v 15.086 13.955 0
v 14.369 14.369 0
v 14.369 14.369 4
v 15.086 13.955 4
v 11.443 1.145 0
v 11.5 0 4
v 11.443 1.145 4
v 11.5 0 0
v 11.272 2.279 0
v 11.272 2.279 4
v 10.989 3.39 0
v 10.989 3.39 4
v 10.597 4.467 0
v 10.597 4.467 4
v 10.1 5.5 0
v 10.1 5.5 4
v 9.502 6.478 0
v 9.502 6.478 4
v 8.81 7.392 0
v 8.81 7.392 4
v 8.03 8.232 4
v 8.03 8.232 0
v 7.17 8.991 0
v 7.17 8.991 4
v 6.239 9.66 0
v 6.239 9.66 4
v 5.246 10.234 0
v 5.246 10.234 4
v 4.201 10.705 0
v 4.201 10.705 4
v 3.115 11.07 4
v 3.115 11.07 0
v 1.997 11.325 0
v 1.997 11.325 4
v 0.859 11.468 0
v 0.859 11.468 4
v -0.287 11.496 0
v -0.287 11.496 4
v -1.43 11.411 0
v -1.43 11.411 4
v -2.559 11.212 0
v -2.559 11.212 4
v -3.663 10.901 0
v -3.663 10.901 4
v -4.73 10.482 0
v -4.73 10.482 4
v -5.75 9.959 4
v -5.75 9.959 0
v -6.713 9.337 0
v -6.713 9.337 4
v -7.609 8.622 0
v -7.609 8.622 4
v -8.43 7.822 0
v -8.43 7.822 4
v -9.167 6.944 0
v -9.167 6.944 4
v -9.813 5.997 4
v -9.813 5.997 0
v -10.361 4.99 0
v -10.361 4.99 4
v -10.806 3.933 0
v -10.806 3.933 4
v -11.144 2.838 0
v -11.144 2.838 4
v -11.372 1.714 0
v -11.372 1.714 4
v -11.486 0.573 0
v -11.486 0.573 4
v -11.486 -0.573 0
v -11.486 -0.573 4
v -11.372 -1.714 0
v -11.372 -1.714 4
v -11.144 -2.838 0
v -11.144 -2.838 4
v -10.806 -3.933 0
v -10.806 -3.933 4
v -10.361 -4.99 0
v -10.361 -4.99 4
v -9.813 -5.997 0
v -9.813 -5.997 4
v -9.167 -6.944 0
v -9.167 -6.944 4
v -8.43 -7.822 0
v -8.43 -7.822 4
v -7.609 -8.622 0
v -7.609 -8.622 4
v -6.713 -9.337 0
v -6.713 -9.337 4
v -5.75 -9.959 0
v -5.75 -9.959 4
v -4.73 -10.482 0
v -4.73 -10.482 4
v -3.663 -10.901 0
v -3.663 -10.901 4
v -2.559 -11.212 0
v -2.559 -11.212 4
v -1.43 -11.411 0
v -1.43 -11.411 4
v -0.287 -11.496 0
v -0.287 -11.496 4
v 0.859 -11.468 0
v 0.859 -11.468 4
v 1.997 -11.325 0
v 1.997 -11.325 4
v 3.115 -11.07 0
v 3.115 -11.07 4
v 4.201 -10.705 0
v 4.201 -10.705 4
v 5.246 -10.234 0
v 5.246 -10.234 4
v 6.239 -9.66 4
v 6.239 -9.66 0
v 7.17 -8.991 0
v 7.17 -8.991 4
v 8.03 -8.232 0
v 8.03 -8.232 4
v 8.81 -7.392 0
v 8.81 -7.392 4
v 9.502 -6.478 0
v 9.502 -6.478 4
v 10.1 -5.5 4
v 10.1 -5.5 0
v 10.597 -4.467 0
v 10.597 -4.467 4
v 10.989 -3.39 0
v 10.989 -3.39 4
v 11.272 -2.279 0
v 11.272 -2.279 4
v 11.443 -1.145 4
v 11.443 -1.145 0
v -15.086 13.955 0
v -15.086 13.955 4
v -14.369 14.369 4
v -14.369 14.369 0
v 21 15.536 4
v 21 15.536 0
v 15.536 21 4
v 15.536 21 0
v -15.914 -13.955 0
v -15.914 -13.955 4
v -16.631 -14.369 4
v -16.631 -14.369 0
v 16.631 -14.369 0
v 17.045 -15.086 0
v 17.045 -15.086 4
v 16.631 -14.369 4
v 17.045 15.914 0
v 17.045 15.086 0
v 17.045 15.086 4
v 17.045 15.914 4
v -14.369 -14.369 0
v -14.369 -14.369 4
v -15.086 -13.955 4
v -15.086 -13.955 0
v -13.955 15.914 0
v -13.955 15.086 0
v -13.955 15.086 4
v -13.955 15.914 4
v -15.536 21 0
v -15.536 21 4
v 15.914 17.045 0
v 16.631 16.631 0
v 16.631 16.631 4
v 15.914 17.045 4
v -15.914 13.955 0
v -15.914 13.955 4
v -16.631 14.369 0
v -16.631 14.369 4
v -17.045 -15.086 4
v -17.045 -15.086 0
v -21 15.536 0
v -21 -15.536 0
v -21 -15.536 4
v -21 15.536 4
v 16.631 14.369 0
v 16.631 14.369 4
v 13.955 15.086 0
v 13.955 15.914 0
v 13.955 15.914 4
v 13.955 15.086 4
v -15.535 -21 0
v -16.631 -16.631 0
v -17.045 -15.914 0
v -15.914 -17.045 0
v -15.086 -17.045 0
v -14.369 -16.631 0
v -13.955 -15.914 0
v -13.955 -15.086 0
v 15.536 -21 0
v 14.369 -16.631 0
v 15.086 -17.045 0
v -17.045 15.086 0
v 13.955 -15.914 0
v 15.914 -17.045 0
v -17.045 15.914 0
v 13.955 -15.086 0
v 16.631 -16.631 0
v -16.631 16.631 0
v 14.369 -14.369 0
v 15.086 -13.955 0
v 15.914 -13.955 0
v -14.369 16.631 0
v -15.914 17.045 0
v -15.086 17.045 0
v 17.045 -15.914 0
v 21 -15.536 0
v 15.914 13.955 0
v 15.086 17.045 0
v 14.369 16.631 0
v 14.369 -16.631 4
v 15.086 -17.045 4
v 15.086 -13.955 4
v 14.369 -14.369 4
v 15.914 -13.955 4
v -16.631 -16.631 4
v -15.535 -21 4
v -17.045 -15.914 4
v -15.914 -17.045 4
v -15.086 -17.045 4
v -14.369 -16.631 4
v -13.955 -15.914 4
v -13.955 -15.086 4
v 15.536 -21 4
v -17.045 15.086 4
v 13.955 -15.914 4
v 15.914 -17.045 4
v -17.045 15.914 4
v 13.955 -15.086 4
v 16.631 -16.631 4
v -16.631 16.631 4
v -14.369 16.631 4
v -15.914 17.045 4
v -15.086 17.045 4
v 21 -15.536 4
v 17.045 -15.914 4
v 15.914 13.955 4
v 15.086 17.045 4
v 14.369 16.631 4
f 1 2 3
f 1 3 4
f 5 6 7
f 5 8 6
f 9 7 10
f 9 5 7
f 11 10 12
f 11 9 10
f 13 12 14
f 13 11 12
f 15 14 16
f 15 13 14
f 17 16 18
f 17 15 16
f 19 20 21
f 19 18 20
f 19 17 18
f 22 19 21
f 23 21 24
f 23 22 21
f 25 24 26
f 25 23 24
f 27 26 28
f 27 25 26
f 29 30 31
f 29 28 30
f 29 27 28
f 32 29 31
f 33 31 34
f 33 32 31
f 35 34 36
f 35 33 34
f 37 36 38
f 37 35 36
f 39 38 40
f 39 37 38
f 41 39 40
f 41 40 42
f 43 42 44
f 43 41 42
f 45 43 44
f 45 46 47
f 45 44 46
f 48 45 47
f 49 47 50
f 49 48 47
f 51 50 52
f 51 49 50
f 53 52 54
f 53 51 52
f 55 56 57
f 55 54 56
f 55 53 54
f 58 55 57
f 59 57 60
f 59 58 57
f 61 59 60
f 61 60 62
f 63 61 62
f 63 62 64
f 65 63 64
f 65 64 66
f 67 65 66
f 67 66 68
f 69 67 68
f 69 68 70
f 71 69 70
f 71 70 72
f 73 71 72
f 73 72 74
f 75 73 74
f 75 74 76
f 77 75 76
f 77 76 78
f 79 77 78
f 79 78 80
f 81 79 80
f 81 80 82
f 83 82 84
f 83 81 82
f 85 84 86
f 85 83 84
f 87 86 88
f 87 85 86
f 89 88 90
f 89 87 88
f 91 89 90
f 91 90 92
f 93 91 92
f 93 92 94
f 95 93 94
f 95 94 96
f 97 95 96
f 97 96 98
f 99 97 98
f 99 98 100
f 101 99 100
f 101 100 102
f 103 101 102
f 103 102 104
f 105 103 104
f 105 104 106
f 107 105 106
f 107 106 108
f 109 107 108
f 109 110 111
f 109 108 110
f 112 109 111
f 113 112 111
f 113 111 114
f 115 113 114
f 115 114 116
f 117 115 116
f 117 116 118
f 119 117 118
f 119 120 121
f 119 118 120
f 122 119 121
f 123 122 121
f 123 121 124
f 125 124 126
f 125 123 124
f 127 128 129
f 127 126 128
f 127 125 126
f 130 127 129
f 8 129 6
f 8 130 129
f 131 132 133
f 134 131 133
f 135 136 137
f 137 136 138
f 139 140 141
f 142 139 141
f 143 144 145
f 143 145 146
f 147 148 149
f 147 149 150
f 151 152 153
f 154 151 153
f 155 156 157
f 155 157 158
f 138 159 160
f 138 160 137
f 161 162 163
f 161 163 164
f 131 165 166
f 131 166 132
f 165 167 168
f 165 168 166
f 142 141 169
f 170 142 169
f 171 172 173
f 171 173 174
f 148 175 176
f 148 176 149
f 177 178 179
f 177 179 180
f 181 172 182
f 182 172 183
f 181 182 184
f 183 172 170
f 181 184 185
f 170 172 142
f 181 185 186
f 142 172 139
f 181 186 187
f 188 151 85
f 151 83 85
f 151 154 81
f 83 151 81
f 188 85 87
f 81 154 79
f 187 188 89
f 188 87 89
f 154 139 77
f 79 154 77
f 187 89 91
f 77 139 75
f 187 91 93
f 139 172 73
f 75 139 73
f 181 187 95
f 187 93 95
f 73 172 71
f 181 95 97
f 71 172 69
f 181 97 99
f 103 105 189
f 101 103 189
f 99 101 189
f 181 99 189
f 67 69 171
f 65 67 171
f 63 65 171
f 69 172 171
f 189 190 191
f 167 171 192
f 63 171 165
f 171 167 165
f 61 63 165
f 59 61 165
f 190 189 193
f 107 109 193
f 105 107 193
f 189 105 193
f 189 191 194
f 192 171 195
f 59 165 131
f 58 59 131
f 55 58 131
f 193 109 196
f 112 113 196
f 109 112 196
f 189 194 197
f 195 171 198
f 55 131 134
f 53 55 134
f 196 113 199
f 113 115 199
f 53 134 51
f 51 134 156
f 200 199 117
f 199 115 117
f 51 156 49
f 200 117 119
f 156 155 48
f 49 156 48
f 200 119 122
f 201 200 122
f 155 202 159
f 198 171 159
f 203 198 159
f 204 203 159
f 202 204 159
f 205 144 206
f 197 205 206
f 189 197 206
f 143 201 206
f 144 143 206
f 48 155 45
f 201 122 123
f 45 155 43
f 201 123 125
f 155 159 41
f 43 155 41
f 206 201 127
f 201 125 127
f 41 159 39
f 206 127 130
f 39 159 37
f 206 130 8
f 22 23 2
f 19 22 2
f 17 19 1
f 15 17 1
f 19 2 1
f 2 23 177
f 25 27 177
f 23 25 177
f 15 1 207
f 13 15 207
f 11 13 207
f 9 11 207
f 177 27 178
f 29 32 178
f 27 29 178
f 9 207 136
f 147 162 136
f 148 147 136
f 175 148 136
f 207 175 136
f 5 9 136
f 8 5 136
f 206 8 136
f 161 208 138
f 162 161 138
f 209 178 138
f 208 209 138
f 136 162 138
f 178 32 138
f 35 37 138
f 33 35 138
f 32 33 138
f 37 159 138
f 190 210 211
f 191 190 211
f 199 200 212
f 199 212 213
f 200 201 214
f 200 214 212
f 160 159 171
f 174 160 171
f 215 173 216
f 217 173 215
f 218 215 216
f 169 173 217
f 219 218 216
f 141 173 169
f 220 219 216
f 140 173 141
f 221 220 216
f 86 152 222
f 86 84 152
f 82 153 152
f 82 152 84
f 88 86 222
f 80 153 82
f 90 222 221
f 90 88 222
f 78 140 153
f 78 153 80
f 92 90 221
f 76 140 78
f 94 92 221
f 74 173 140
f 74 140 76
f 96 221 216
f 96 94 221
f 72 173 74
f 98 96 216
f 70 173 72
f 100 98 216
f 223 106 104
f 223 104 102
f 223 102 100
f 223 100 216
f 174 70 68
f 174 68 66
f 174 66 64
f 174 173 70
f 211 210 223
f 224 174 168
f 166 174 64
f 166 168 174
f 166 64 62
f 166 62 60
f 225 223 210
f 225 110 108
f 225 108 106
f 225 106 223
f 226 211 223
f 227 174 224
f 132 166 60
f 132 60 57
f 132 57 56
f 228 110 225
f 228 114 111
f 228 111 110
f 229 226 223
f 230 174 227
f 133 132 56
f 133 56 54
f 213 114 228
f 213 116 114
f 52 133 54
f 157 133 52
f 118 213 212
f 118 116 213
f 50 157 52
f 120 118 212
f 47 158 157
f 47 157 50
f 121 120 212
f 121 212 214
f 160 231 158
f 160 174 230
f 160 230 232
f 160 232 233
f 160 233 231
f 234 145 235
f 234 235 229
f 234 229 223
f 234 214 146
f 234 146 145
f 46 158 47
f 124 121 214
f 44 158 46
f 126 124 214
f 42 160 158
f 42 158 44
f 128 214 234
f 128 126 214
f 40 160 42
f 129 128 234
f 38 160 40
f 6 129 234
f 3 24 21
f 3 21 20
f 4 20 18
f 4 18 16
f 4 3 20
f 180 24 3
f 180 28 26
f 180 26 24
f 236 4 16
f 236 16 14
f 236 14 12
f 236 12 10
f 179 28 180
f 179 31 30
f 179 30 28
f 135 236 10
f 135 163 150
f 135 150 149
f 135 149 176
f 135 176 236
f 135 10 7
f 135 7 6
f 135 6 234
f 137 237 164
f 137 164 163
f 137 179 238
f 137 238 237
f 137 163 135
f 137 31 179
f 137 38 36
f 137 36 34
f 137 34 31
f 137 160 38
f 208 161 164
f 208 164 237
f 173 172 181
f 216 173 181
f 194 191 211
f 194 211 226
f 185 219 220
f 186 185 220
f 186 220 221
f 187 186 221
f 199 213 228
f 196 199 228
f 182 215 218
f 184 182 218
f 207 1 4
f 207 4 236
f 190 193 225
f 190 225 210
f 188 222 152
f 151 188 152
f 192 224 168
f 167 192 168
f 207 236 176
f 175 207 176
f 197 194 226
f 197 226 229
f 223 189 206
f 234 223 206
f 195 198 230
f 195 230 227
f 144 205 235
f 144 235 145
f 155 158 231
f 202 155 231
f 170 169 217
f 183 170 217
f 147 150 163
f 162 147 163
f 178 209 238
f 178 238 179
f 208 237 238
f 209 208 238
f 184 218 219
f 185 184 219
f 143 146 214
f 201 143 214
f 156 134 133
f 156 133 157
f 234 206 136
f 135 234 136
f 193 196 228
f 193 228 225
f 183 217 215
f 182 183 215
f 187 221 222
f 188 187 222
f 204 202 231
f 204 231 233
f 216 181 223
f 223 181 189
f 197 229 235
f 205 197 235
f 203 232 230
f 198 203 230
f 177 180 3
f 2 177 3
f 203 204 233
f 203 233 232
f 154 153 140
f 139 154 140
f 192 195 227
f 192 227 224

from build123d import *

# Parameters (mm, degrees)
CYLINDER_R               = 11.5
CYLINDER_DEPTH           = 8.8
PRISM001_DEPTH           = 16
CUBE002_W                = 5
CUBE002_H                = 10
CUBE002_DEPTH            = 4.2
UNION001_PLACEMENT_ANGLE = 135
PRISM002_DEPTH           = 16
CUBE003_W                = 5
CUBE003_H                = 10
CUBE003_DEPTH            = 4.2
UNION002_PLACEMENT_ANGLE = 225.000007
PRISM003_DEPTH           = 16
CUBE004_W                = 5
CUBE004_H                = 10
CUBE004_DEPTH            = 4.2
UNION003_PLACEMENT_ANGLE = -45
PRISM_DEPTH              = 16
CUBE001_W                = 5
CUBE001_H                = 10
CUBE001_DEPTH            = 4.2
UNION_PLACEMENT_ANGLE    = 45
CUBE_W                   = 42
CUBE_H                   = 42
CUBE_DEPTH               = 4


with BuildPart() as cylinder:
    # cylinder → cylinder (new body)
    with BuildSketch(Plane.XY.offset(-4.4)):
        Circle(CYLINDER_R)
    extrude(amount=CYLINDER_DEPTH)


with BuildPart() as prism001:
    # prism001 → prism001 (new body)
    with BuildSketch(Plane(origin=(21.9203, 0, -8), x_dir=(1, 0, 0), z_dir=(0, 0, 1))):
        Polygon((1.6, 0), (1.385641, 0.8), (0.8, 1.385641), (0, 1.6), (-0.8, 1.385641), (-1.385641, 0.8), (-1.6, 0), (-1.385641, -0.8), (-0.8, -1.385641), (0, -1.6), (0.8, -1.385641), (1.385641, -0.8), align=None)
    extrude(amount=PRISM001_DEPTH)


with BuildPart() as union001:
    # cube002 → cube002 (new body)
    with BuildSketch(Plane(origin=(25.8345, -5, -0.1), x_dir=(1, 0, 0), z_dir=(0, 0, 1))):
        with Locations((2.5, 5)):
            Rectangle(CUBE002_W, CUBE002_H)
    extrude(amount=CUBE002_DEPTH)

    # union001: union prism001
    add(prism001.part)


with BuildPart() as union001_1:
    # union001 placement: moved
    add(union001.part.rotate(Axis((0, 0, 0), (0, 0, 1)), UNION001_PLACEMENT_ANGLE))


with BuildPart() as prism002:
    # prism002 → prism002 (new body)
    with BuildSketch(Plane(origin=(21.9203, 0, -8), x_dir=(1, 0, 0), z_dir=(0, 0, 1))):
        Polygon((1.6, 0), (1.385641, 0.8), (0.8, 1.385641), (0, 1.6), (-0.8, 1.385641), (-1.385641, 0.8), (-1.6, 0), (-1.385641, -0.8), (-0.8, -1.385641), (0, -1.6), (0.8, -1.385641), (1.385641, -0.8), align=None)
    extrude(amount=PRISM002_DEPTH)


with BuildPart() as union002:
    # cube003 → cube003 (new body)
    with BuildSketch(Plane(origin=(25.8345, -5, -0.1), x_dir=(1, 0, 0), z_dir=(0, 0, 1))):
        with Locations((2.5, 5)):
            Rectangle(CUBE003_W, CUBE003_H)
    extrude(amount=CUBE003_DEPTH)

    # union002: union prism002
    add(prism002.part)


with BuildPart() as union002_1:
    # union002 placement: moved
    add(union002.part.rotate(Axis((0, 0, 0), (0, 0, 1)), UNION002_PLACEMENT_ANGLE))


with BuildPart() as prism003:
    # prism003 → prism003 (new body)
    with BuildSketch(Plane(origin=(21.9203, 0, -8), x_dir=(1, 0, 0), z_dir=(0, 0, 1))):
        Polygon((1.6, 0), (1.385641, 0.8), (0.8, 1.385641), (0, 1.6), (-0.8, 1.385641), (-1.385641, 0.8), (-1.6, 0), (-1.385641, -0.8), (-0.8, -1.385641), (0, -1.6), (0.8, -1.385641), (1.385641, -0.8), align=None)
    extrude(amount=PRISM003_DEPTH)


with BuildPart() as union003:
    # cube004 → cube004 (new body)
    with BuildSketch(Plane(origin=(25.8345, -5, -0.1), x_dir=(1, 0, 0), z_dir=(0, 0, 1))):
        with Locations((2.5, 5)):
            Rectangle(CUBE004_W, CUBE004_H)
    extrude(amount=CUBE004_DEPTH)

    # union003: union prism003
    add(prism003.part)


with BuildPart() as union003_1:
    # union003 placement: moved
    add(union003.part.rotate(Axis((0, 0, 0), (0, 0, 1)), UNION003_PLACEMENT_ANGLE))


with BuildPart() as prism:
    # prism → prism (new body)
    with BuildSketch(Plane(origin=(21.9203, 0, -8), x_dir=(1, 0, 0), z_dir=(0, 0, 1))):
        Polygon((1.6, 0), (1.385641, 0.8), (0.8, 1.385641), (0, 1.6), (-0.8, 1.385641), (-1.385641, 0.8), (-1.6, 0), (-1.385641, -0.8), (-0.8, -1.385641), (0, -1.6), (0.8, -1.385641), (1.385641, -0.8), align=None)
    extrude(amount=PRISM_DEPTH)


with BuildPart() as union004:
    # cube001 → cube001 (new body)
    with BuildSketch(Plane(origin=(25.8345, -5, -0.1), x_dir=(1, 0, 0), z_dir=(0, 0, 1))):
        with Locations((2.5, 5)):
            Rectangle(CUBE001_W, CUBE001_H)
    extrude(amount=CUBE001_DEPTH)

    # union: union prism
    add(prism.part)


with BuildPart() as union004_1:
    # union placement: moved
    add(union004.part.rotate(Axis((0, 0, 0), (0, 0, 1)), UNION_PLACEMENT_ANGLE))

    # Group: union union001, union002, union003
    add(union001_1.part)
    add(union002_1.part)
    add(union003_1.part)

    # union004: union cylinder
    add(cylinder.part)


with BuildPart() as difference:
    # cube → cube (new body)
    with BuildSketch(Plane(origin=(-21, -21, 0), x_dir=(1, 0, 0), z_dir=(0, 0, 1))):
        with Locations((21, 21)):
            Rectangle(CUBE_W, CUBE_H)
    extrude(amount=CUBE_DEPTH)

    # difference: cut union004
    add(union004_1.part, mode=Mode.SUBTRACT)


solid = difference.part
